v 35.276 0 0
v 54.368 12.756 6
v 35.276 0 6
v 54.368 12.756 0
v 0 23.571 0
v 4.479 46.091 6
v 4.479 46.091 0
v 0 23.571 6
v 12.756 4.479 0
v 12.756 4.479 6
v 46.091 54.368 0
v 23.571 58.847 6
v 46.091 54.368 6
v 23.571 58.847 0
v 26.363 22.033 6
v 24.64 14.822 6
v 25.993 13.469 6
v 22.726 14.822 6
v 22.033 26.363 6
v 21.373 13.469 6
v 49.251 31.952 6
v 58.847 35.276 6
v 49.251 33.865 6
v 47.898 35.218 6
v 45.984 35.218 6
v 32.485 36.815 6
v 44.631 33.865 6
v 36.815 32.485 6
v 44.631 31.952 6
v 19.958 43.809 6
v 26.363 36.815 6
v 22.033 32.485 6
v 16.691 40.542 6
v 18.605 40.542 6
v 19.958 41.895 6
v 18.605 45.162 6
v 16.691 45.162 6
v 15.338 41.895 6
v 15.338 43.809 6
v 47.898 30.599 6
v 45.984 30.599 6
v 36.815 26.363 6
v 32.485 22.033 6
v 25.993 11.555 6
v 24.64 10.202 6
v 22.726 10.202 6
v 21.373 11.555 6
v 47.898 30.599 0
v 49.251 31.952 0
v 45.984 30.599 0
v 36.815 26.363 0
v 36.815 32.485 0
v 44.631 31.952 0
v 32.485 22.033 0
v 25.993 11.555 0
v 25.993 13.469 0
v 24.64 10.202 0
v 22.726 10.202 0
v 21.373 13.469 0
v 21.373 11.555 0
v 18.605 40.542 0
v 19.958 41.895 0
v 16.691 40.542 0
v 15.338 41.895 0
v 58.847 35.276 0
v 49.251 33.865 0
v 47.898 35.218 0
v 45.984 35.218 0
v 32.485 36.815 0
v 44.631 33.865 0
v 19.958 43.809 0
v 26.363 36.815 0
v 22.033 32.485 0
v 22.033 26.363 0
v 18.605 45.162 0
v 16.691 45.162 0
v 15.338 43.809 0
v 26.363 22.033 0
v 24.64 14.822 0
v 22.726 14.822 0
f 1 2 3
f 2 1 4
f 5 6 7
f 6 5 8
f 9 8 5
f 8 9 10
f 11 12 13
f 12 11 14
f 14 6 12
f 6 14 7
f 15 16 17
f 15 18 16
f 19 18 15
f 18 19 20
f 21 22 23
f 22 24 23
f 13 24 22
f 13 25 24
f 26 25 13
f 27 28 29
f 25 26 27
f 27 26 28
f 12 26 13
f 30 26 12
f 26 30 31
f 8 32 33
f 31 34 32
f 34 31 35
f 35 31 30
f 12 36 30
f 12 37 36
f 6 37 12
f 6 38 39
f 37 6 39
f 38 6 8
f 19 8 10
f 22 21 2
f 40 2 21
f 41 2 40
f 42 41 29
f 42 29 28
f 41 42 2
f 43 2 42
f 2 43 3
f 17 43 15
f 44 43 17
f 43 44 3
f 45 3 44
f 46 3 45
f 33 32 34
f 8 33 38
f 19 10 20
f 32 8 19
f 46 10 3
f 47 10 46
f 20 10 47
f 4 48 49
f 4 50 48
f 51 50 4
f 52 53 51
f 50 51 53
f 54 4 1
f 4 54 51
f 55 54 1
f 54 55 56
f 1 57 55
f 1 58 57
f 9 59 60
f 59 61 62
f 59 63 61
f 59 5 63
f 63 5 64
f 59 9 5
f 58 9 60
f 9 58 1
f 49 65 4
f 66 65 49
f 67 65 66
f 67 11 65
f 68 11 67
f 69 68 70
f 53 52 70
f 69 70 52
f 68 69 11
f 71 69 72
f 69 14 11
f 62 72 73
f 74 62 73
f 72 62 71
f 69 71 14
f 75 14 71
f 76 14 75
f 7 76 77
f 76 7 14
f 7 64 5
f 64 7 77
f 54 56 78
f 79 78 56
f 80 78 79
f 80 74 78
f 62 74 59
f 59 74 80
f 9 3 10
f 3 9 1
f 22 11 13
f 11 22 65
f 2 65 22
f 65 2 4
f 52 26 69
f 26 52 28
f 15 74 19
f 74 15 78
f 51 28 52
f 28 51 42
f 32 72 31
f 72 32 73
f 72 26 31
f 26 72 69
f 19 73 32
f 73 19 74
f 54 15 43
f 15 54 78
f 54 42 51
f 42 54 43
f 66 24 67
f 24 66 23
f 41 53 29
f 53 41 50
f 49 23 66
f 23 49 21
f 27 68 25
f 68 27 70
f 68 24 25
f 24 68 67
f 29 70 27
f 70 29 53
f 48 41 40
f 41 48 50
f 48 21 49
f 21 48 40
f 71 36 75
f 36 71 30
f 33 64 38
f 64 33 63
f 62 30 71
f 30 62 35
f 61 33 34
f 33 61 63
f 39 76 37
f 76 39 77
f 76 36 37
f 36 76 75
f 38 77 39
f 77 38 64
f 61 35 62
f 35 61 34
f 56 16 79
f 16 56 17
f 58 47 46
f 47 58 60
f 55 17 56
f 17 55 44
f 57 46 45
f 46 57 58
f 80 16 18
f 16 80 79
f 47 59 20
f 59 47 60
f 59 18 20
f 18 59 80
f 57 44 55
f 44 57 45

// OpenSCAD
$fn = 32;

// ----------------------------------------------------------------------
// Polygon plate: 8-gon R30, 3 bolt windows
// ----------------------------------------------------------------------

// --- parameters (mm) ---
sides = 8;                // number of polygon sides
plate_r = 30;             // circumscribed radius of the polygon
bore_r = 8;               // centre bore radius
bolts = 3;                // number of bolt windows
ring_r = 17.86;           // bolt-circle radius
bolt_r = 2.5;             // bolt window radius
plate_t = 6;              // plate thickness, Z (extrusion height)

plate_d = 2 * plate_r;  // circumscribed diameter
bore_d = 2 * bore_r;  // centre bore diameter
bolt_d = 2 * bolt_r;  // bolt window diameter
ring_d = 2 * ring_r;  // bolt-circle diameter

profile = [[58.847, 35.276], [46.091, 54.368], [23.571, 58.847], [4.479, 46.091], [0, 23.571], [12.756, 4.479], [35.276, 0], [54.368, 12.756]];  // primary outline, 8 points, counter clockwise
void_1 = [[36.815, 32.485], [32.485, 36.815], [26.363, 36.815], [22.033, 32.485], [22.033, 26.363], [26.363, 22.033], [32.485, 22.033], [36.815, 26.363]];  // centre bore, 8 points
void_2 = [[49.251, 33.865], [47.898, 35.218], [45.984, 35.218], [44.631, 33.865], [44.631, 31.952], [45.984, 30.599], [47.898, 30.599], [49.251, 31.952]];  // bolt window 1, 8 points
void_3 = [[19.958, 43.809], [18.605, 45.162], [16.691, 45.162], [15.338, 43.809], [15.338, 41.895], [16.691, 40.542], [18.605, 40.542], [19.958, 41.895]];  // bolt window 2, 8 points
void_4 = [[25.993, 13.469], [24.64, 14.822], [22.726, 14.822], [21.373, 13.469], [21.373, 11.555], [22.726, 10.202], [24.64, 10.202], [25.993, 11.555]];  // bolt window 3, 8 points

// --- the one profile operation ---
difference() {
  linear_extrude(height = plate_t) polygon(points = profile);
  translate([0, 0, -1])
    linear_extrude(height = plate_t + 2) polygon(points = void_1);
  translate([0, 0, -1])
    linear_extrude(height = plate_t + 2) polygon(points = void_2);
  translate([0, 0, -1])
    linear_extrude(height = plate_t + 2) polygon(points = void_3);
  translate([0, 0, -1])
    linear_extrude(height = plate_t + 2) polygon(points = void_4);
}
